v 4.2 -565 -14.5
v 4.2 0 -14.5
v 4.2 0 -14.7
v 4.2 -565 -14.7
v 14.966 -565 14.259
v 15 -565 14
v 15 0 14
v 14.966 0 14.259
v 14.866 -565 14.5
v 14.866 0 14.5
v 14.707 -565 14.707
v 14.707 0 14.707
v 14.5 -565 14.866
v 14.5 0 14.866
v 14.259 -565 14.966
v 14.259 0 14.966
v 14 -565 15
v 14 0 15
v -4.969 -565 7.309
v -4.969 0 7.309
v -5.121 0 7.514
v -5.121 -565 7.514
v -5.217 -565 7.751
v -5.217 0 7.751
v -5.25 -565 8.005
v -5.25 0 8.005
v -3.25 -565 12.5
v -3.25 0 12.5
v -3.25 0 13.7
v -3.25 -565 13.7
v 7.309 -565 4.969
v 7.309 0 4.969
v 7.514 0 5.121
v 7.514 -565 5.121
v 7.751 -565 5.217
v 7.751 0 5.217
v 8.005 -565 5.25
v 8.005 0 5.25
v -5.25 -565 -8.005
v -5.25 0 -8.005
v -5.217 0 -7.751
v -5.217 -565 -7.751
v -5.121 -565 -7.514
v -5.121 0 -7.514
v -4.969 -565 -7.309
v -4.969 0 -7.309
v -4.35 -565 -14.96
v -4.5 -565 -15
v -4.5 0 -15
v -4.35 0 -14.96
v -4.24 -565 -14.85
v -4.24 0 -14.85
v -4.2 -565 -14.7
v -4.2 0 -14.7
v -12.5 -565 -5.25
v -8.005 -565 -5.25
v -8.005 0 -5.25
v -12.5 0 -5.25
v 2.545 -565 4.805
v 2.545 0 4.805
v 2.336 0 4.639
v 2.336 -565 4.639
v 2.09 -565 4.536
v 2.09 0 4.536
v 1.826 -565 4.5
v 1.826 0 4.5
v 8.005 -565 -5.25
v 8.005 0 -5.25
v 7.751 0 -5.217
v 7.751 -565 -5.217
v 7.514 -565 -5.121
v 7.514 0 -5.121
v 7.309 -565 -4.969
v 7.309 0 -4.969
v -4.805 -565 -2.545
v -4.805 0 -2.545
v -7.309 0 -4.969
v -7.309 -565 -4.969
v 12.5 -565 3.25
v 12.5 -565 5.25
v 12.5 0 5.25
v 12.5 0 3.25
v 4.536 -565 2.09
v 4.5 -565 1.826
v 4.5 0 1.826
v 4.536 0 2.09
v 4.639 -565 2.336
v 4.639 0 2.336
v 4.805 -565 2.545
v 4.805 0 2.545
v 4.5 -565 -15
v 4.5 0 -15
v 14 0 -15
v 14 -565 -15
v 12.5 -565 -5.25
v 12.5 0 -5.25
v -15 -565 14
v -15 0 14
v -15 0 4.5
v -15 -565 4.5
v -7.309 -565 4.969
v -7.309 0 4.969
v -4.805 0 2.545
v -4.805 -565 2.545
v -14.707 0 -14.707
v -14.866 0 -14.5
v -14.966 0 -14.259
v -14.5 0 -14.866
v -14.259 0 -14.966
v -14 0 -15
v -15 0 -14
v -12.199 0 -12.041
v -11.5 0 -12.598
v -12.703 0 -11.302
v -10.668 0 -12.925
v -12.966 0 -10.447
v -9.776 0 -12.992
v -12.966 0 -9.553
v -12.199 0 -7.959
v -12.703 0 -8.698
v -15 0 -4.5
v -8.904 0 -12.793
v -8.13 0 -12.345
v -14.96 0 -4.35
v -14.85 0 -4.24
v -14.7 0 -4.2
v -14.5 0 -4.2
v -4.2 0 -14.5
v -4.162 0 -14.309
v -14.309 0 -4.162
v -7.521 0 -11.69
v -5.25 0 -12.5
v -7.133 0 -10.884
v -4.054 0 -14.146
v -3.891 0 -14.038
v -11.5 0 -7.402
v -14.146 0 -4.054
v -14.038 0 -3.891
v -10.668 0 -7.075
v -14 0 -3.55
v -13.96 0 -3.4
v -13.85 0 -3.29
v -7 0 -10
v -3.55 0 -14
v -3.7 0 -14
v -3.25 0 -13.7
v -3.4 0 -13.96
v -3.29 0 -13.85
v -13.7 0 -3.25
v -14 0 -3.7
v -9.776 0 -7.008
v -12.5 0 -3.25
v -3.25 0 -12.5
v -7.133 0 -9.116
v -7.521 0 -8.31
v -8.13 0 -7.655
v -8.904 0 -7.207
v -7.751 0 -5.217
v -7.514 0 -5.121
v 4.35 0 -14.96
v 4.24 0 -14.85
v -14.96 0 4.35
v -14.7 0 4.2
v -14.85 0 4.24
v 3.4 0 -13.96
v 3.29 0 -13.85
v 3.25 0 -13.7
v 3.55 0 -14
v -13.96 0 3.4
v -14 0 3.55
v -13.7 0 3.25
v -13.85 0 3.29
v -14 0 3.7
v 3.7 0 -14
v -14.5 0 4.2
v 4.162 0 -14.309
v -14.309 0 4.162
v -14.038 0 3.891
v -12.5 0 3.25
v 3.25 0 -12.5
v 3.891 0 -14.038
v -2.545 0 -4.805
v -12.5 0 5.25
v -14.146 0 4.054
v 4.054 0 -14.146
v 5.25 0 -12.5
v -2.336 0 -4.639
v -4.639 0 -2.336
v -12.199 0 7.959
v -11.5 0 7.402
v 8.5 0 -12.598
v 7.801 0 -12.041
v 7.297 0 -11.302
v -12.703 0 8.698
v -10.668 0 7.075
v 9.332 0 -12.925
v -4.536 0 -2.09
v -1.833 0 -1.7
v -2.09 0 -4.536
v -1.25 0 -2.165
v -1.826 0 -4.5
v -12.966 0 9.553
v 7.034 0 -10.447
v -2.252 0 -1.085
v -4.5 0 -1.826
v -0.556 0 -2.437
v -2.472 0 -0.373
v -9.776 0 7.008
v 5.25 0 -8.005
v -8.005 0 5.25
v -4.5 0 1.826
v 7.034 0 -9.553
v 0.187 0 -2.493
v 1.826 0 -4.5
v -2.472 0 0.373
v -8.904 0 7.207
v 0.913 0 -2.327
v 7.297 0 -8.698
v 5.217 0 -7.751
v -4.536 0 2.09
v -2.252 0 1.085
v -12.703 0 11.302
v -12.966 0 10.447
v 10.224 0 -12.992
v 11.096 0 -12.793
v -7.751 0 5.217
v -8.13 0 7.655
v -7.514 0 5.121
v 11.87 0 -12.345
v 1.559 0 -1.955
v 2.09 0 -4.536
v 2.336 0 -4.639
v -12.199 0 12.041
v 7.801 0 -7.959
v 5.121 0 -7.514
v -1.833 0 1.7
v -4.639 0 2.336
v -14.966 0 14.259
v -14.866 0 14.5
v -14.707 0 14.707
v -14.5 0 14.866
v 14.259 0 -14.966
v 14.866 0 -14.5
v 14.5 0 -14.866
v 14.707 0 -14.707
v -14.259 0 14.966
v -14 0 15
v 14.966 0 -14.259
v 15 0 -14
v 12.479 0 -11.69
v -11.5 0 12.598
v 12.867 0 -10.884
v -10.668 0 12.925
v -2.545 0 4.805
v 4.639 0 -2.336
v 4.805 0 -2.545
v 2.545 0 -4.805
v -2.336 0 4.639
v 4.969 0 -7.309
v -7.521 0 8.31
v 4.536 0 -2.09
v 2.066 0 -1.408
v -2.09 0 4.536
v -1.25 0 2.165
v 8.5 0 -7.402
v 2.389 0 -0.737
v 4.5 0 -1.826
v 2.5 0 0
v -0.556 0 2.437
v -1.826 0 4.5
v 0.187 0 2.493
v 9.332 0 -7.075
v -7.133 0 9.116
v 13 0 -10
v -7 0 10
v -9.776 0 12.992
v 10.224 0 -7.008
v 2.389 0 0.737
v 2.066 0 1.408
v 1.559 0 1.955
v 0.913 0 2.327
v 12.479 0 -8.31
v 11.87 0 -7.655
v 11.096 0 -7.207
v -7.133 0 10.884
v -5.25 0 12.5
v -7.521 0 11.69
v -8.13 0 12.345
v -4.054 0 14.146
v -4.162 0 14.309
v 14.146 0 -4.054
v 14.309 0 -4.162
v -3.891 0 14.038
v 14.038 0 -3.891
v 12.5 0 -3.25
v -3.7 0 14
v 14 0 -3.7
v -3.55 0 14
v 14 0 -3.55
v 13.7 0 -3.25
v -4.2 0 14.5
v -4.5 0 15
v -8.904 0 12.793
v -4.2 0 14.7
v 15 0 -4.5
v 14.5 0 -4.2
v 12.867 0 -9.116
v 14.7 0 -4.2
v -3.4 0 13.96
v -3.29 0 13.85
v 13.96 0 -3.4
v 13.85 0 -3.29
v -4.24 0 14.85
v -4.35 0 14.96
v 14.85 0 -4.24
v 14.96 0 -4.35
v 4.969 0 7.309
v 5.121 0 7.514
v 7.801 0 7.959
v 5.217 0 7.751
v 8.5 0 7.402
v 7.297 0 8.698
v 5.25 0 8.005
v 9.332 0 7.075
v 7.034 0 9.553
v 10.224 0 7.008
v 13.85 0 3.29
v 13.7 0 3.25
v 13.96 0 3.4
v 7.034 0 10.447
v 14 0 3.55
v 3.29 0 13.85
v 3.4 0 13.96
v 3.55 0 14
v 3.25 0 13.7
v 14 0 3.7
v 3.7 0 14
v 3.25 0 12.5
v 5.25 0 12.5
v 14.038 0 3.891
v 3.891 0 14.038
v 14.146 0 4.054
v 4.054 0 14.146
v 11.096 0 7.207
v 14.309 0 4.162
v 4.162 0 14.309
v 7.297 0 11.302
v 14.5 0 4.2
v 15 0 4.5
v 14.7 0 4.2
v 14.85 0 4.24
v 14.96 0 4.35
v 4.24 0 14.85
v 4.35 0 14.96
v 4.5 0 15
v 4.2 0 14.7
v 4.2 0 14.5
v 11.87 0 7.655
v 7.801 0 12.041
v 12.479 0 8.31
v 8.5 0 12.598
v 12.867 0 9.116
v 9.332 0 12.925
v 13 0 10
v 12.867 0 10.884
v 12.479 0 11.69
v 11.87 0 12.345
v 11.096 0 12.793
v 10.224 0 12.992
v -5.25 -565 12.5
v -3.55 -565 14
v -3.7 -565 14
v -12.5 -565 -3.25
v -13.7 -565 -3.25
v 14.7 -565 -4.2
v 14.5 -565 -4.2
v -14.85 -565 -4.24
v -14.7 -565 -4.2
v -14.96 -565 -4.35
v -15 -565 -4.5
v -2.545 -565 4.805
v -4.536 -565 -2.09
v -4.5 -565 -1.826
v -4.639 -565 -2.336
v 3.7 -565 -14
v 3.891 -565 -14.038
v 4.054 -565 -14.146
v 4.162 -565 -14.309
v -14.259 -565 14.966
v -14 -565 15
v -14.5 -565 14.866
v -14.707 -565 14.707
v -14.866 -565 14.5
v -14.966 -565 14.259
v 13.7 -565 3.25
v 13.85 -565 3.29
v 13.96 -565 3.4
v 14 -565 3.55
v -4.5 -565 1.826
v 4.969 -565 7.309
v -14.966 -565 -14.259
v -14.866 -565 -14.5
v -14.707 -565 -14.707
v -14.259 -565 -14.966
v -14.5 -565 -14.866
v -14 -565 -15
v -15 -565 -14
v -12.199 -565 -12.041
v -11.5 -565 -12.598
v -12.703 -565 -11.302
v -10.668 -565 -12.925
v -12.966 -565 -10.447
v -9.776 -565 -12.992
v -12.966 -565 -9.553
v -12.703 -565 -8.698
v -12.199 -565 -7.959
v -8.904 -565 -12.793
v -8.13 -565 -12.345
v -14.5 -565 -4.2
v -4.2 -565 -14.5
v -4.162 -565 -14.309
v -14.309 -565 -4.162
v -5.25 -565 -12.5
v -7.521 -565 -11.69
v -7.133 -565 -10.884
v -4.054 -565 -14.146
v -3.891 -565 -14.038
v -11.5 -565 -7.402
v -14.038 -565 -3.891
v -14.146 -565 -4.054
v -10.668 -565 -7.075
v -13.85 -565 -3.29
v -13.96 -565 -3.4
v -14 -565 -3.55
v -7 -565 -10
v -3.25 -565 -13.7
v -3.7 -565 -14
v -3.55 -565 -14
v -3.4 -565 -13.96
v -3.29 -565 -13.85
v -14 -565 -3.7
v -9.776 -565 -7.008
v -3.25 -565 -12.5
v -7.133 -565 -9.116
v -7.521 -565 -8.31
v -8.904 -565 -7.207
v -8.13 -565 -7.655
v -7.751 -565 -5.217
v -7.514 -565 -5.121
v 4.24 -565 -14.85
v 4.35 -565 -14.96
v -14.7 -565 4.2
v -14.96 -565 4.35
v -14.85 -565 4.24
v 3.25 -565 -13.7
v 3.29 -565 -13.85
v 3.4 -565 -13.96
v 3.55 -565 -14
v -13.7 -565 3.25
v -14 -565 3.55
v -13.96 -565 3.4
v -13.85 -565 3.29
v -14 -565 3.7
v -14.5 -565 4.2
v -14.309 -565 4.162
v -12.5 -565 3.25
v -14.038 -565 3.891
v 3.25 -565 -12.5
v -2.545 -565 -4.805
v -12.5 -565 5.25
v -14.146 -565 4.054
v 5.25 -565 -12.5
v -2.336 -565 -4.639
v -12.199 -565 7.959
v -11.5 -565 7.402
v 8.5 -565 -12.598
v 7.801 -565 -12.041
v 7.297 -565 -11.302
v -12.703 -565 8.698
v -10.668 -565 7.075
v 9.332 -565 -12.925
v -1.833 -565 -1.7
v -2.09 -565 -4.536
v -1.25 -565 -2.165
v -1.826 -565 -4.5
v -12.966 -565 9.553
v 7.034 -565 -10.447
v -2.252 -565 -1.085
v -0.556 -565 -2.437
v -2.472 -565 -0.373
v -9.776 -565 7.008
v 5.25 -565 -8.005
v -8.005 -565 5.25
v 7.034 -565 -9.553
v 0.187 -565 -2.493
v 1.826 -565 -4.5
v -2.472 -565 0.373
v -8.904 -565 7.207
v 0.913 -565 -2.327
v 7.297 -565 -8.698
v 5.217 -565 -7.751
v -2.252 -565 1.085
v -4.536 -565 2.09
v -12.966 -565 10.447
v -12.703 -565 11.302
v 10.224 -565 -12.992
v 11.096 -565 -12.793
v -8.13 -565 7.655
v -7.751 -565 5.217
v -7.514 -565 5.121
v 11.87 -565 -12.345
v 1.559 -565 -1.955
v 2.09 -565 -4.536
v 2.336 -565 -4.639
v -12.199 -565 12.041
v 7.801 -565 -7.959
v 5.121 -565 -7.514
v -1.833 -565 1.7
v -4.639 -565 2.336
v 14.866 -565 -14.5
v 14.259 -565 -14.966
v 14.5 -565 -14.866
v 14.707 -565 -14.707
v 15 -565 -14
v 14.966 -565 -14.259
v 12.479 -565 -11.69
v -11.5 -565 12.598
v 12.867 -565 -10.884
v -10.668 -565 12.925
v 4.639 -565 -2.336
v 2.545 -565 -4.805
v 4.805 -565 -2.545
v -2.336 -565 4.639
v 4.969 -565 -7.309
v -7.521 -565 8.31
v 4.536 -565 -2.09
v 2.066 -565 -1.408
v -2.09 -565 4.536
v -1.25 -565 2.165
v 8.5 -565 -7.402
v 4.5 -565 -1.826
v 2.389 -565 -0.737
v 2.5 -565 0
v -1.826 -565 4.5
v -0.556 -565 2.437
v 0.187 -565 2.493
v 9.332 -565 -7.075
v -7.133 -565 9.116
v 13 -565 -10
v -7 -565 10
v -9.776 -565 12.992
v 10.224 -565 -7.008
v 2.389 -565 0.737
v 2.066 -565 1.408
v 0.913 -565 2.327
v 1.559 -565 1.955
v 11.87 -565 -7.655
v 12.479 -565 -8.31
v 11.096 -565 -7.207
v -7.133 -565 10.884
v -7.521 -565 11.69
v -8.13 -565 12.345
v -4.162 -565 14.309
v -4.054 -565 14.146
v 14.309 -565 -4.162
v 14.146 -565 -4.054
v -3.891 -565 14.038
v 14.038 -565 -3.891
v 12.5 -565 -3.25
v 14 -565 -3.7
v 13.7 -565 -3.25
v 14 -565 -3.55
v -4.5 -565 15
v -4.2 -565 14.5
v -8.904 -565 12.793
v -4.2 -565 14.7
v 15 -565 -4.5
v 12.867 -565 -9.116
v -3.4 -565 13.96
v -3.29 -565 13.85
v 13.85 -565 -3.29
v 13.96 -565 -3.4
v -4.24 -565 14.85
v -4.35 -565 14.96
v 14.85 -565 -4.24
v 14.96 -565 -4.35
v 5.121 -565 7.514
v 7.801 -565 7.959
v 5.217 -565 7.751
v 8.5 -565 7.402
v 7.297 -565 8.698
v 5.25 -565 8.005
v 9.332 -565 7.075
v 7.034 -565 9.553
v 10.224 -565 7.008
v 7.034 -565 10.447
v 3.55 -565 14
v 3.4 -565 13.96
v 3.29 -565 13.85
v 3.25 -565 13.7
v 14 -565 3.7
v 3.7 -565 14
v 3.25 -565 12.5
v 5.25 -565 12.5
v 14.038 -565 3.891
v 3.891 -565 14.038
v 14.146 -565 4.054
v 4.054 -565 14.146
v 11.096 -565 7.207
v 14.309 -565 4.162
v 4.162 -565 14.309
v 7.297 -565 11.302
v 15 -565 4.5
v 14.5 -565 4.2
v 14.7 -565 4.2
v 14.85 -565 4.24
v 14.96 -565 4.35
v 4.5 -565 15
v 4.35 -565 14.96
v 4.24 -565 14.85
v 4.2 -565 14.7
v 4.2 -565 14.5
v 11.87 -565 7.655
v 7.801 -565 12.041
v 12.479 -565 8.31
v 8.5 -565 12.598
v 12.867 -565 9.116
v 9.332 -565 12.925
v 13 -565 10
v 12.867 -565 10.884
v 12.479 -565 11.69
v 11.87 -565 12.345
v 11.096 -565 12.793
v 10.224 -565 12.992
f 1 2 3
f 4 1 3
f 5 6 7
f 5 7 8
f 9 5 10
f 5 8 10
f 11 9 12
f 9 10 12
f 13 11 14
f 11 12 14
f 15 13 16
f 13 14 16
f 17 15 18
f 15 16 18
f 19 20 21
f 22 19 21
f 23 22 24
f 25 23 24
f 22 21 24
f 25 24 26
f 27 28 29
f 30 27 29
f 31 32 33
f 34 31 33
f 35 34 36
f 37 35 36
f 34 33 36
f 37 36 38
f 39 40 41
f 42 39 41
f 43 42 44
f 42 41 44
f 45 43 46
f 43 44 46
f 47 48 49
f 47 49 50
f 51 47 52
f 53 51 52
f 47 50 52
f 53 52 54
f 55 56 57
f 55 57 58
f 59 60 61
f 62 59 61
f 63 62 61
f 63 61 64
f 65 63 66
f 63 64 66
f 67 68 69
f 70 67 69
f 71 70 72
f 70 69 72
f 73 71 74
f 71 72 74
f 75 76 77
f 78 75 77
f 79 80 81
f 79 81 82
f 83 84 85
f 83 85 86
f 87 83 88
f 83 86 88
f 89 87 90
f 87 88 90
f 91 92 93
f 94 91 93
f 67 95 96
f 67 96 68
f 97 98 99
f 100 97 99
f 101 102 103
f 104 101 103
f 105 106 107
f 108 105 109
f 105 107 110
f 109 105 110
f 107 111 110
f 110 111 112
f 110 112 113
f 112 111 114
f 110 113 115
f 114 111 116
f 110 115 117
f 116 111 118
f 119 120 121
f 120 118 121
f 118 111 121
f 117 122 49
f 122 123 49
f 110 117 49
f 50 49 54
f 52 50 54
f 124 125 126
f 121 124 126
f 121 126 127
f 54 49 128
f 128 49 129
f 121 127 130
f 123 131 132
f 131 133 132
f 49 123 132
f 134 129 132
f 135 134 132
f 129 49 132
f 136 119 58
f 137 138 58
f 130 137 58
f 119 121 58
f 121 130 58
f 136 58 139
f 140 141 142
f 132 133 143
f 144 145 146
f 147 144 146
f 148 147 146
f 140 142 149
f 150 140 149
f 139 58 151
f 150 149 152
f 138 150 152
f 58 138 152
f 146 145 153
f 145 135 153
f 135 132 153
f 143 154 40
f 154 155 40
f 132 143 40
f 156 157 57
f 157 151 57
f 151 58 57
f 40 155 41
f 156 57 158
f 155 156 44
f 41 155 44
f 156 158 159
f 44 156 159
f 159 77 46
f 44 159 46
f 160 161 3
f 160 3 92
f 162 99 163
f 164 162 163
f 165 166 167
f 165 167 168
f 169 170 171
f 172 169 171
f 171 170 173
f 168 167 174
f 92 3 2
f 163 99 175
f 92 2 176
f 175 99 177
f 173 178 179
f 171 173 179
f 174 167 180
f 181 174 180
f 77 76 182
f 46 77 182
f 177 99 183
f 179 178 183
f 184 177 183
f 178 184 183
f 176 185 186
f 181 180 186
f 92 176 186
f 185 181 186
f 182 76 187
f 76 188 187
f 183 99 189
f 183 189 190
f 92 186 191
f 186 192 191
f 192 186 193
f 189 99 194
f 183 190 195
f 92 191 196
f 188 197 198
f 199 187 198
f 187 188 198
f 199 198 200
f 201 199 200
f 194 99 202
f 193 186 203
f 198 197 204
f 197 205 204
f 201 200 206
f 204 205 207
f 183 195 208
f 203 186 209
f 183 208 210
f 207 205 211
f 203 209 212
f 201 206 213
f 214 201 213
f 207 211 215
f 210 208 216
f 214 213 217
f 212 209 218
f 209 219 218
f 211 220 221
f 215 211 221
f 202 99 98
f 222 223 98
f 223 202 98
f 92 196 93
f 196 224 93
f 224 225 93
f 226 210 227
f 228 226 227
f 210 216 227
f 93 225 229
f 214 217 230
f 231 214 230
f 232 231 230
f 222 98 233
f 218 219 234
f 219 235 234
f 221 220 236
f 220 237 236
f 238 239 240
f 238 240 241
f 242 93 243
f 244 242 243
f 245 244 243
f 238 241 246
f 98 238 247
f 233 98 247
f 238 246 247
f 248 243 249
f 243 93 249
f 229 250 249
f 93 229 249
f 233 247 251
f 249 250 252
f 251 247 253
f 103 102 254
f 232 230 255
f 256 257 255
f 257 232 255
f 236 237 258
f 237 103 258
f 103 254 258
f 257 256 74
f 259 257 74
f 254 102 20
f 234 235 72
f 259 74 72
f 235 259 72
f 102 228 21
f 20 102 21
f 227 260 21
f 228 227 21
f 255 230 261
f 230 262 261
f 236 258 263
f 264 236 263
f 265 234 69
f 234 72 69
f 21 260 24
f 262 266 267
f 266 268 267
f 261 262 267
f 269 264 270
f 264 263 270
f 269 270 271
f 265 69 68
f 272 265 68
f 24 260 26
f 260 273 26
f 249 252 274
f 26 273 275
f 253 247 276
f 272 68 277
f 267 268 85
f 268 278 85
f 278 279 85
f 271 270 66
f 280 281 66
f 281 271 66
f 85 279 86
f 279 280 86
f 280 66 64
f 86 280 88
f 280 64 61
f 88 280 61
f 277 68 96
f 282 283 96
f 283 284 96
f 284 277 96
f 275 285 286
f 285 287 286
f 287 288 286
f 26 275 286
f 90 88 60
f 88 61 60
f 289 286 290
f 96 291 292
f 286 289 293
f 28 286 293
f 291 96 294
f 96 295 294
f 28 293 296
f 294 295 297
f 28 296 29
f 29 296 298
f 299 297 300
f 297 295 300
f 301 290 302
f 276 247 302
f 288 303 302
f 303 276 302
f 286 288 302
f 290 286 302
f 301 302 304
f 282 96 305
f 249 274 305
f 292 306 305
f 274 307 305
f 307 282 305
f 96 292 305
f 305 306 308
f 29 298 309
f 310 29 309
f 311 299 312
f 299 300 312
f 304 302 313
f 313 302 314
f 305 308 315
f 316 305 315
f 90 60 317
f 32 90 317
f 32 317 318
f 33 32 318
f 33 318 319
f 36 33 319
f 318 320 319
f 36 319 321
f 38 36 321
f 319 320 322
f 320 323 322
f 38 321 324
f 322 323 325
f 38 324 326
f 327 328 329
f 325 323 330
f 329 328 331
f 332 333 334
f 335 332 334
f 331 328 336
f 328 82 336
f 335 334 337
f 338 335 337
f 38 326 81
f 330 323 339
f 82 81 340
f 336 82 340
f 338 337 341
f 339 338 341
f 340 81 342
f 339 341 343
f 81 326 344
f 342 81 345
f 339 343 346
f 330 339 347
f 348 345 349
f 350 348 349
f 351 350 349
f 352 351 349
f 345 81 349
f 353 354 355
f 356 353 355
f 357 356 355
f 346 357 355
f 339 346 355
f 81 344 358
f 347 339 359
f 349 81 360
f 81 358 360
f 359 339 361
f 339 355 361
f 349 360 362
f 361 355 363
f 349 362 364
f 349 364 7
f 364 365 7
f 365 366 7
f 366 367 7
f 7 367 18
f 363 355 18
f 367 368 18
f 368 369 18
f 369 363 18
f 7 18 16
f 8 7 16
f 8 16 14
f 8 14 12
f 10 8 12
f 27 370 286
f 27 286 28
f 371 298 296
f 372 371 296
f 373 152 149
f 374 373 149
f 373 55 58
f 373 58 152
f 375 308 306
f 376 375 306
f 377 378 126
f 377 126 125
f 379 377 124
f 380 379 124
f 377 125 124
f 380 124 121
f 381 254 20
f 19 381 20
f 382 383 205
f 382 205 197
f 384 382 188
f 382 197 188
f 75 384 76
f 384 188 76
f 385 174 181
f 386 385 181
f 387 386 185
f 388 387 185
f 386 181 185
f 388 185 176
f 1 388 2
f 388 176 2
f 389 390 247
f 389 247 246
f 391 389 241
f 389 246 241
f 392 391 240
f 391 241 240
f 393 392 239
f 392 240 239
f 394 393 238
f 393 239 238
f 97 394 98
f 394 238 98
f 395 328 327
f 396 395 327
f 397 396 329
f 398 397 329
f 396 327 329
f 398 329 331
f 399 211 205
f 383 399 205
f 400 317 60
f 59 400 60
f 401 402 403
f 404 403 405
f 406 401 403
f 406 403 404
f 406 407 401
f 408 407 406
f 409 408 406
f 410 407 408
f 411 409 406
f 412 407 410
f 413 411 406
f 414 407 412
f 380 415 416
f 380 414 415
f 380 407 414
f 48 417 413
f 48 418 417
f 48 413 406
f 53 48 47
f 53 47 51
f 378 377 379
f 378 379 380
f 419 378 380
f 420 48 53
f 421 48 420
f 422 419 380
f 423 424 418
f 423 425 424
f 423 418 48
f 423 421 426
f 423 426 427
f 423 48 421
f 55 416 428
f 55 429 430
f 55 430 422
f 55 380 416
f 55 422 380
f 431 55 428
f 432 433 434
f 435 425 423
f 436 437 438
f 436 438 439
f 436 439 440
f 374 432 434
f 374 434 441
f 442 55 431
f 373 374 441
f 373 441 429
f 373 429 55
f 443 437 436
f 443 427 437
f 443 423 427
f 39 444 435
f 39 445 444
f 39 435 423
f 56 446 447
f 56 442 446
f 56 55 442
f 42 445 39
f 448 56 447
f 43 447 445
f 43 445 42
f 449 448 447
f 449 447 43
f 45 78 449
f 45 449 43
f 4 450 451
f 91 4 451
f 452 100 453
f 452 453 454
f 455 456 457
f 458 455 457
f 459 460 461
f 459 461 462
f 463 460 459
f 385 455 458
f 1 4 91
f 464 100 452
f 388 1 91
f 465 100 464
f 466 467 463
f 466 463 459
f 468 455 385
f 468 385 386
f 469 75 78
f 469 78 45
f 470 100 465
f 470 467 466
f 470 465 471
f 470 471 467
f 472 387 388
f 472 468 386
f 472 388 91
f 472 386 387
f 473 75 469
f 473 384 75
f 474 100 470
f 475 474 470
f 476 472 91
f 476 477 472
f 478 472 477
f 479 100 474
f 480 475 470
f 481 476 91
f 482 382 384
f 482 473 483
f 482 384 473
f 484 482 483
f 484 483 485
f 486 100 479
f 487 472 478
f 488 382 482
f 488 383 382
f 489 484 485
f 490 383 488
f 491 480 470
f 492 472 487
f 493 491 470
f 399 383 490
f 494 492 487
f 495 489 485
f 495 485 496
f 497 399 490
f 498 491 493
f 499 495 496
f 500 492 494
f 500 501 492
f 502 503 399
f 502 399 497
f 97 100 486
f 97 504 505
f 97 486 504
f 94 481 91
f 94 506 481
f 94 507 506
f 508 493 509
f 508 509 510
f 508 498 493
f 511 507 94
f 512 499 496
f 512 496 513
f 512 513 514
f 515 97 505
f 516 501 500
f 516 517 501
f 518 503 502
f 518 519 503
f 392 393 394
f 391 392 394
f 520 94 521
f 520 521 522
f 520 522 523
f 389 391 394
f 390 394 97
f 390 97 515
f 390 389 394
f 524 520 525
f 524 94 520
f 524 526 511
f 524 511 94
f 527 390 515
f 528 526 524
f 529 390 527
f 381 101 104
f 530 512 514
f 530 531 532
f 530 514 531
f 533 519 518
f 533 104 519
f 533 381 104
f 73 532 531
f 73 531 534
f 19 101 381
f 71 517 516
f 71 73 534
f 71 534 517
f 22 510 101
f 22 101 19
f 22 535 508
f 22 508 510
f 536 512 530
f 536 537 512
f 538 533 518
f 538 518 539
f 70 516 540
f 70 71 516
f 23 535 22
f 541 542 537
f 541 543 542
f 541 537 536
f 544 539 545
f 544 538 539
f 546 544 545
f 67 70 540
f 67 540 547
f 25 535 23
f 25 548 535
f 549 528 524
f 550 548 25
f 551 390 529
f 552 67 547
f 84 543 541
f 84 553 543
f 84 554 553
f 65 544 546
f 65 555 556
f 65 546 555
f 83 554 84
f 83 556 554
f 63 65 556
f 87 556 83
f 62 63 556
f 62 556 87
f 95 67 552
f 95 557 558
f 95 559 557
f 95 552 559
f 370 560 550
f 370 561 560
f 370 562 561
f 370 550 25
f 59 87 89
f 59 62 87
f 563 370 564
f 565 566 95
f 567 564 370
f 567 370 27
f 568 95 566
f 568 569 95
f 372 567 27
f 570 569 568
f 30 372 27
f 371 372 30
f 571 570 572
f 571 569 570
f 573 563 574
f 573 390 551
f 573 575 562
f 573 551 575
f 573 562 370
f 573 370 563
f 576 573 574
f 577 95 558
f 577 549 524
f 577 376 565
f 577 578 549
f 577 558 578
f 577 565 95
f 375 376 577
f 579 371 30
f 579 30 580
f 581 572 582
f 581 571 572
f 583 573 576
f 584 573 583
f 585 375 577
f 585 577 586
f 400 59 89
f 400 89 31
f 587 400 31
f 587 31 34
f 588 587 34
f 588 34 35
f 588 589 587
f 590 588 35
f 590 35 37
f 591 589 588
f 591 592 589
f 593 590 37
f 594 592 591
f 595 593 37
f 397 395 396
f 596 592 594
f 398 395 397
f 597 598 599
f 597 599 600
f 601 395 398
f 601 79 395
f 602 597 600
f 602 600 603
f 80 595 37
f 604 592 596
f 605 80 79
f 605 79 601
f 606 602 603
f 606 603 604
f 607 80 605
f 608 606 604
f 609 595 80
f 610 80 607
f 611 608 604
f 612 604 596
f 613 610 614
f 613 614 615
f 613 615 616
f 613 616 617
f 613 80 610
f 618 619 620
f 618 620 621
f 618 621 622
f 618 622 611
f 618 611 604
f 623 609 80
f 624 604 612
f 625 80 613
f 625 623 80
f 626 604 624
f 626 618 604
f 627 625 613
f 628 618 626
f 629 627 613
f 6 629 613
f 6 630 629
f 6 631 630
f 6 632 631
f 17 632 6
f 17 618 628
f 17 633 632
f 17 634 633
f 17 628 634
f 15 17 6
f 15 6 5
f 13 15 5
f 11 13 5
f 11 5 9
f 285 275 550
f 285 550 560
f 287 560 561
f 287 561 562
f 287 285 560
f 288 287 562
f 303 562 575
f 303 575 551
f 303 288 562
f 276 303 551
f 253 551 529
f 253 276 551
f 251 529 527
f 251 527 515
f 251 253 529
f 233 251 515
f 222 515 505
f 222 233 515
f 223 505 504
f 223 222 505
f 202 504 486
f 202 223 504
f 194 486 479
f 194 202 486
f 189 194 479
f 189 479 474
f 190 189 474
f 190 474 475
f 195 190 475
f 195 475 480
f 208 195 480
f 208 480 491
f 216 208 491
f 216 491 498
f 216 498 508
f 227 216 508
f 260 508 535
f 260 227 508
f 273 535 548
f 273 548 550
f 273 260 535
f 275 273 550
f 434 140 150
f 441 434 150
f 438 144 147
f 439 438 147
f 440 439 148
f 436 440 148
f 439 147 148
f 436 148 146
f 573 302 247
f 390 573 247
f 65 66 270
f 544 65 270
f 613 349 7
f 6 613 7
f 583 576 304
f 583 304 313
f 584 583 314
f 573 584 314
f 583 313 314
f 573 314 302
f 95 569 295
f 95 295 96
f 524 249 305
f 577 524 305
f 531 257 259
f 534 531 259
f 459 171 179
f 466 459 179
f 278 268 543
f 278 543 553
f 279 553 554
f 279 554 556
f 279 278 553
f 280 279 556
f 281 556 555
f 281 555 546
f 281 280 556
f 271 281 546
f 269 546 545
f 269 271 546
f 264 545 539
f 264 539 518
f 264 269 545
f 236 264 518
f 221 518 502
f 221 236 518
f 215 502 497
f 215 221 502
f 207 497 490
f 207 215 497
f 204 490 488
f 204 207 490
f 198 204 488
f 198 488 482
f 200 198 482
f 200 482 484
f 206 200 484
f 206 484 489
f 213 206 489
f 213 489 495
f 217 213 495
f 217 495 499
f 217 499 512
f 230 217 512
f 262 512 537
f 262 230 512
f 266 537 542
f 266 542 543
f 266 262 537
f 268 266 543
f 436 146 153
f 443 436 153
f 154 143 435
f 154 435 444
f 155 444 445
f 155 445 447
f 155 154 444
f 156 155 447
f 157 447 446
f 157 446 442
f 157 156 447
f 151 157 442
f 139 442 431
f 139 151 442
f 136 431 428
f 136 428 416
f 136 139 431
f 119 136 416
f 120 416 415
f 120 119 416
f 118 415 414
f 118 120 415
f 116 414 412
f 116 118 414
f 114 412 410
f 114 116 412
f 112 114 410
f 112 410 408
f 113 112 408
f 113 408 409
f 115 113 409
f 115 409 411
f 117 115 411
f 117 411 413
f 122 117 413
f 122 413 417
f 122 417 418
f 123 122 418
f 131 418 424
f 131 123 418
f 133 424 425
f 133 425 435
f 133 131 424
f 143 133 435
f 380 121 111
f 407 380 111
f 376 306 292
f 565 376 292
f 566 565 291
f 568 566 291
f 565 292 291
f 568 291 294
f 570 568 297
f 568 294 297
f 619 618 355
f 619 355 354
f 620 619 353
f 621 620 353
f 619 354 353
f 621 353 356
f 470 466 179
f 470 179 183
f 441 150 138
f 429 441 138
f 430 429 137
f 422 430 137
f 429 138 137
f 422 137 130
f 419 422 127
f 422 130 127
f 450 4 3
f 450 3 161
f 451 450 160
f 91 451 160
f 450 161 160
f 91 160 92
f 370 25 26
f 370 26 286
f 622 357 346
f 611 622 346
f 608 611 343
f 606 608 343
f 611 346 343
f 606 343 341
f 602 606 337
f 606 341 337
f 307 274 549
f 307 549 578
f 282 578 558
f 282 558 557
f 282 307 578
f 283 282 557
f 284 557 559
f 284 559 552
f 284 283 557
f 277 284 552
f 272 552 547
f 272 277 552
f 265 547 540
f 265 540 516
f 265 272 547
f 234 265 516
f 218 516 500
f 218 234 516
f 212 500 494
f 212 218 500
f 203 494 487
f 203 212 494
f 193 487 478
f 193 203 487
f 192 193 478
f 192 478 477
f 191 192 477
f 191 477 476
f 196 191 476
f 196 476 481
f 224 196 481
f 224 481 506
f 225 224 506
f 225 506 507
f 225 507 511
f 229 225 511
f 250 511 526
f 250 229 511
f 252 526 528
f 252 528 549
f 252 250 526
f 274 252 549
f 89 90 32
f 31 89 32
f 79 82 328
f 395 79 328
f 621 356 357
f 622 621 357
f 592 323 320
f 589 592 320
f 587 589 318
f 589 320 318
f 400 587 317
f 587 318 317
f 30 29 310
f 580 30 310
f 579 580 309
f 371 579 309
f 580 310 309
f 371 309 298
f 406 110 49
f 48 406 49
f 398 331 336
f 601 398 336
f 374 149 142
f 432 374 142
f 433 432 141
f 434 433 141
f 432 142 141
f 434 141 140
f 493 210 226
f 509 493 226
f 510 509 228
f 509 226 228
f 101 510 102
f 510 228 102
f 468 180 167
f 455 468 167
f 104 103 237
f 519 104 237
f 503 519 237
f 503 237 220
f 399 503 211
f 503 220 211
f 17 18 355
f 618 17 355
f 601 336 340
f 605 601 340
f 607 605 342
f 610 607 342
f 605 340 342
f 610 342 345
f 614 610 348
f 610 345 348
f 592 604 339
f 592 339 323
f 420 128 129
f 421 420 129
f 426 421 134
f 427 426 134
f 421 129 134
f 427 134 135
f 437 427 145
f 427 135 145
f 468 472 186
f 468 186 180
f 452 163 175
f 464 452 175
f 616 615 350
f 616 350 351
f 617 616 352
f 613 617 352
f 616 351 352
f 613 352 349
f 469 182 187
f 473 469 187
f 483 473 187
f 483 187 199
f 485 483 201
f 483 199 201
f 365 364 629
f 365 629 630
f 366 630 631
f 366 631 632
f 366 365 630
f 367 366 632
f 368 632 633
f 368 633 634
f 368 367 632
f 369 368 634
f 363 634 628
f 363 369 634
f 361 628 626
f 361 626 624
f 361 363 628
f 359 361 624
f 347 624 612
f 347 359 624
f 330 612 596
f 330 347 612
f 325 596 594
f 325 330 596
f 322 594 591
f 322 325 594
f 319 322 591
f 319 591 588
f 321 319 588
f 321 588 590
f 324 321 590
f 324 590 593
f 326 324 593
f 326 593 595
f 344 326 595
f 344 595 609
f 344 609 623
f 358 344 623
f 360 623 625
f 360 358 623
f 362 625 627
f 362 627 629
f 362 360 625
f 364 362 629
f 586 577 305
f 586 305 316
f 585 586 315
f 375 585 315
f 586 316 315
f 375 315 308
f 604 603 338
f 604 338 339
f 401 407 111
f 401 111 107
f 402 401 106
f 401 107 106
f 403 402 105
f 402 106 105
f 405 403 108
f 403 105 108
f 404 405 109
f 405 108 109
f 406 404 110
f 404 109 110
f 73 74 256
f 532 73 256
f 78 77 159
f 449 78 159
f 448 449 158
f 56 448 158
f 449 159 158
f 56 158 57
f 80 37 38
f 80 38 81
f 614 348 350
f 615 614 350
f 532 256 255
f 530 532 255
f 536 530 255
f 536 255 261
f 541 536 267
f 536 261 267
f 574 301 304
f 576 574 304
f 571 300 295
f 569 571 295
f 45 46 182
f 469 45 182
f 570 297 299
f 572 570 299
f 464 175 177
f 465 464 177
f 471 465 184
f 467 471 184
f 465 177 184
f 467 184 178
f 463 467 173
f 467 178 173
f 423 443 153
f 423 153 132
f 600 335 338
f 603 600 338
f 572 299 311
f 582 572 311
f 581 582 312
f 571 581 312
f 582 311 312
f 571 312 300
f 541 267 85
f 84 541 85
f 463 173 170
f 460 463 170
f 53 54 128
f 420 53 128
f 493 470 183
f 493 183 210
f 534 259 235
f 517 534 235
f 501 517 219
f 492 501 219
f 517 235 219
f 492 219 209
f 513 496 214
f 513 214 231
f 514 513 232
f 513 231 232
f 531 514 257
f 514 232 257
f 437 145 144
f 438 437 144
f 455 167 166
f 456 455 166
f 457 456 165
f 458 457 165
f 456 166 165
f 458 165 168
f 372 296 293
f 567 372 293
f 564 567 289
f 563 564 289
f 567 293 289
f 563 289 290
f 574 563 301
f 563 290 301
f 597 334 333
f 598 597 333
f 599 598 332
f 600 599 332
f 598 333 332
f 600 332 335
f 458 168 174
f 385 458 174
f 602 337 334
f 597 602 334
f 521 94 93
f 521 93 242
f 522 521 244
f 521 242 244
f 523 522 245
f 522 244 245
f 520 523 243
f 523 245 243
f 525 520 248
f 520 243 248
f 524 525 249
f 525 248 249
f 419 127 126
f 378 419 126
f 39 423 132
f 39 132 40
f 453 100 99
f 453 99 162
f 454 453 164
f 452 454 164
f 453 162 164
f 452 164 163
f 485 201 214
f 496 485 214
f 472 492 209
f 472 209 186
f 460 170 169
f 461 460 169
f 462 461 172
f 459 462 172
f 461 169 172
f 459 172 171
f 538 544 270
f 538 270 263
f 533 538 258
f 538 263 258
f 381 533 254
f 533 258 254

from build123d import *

# Parameters (mm, degrees)
F0_R     = 3
F0_R_2   = 2.5
F1_DEPTH = 565


with BuildPart() as f1:
    # F0 (on Front) → F1 (new body)
    with BuildSketch(Plane.XZ):
        with BuildLine():
            Line((-4.5, 15), (-14, 15))
            ThreePointArc((-14, 15), (-14.707107, 14.707107), (-15, 14))
            Line((-15, 14), (-15, 4.5))
            ThreePointArc((-15, 4.5), (-14.912132, 4.287868), (-14.7, 4.2))
            Line((-14.7, 4.2), (-14.5, 4.2))
            ThreePointArc((-14.5, 4.2), (-14.146447, 4.053553), (-14, 3.7))
            Line((-14, 3.7), (-14, 3.55))
            ThreePointArc((-14, 3.55), (-13.912132, 3.337868), (-13.7, 3.25))
            Line((-13.7, 3.25), (-12.5, 3.25))
            Line((-12.5, 3.25), (-12.5, 5.25))
            Line((-12.5, 5.25), (-8.004644, 5.25))
            ThreePointArc((-8.004644, 5.25), (-7.629545, 5.176985), (-7.309222, 4.968602))
            Line((-7.309222, 4.968602), (-4.804579, 2.544753))
            ThreePointArc((-4.804579, 2.544753), (-4.579288, 2.216394), (-4.5, 1.826151))
            Line((-4.5, 1.826151), (-4.5, -1.826151))
            ThreePointArc((-4.5, -1.826151), (-4.579288, -2.216394), (-4.804579, -2.544753))
            Line((-4.804579, -2.544753), (-7.309222, -4.968602))
            ThreePointArc((-7.309222, -4.968602), (-7.629545, -5.176985), (-8.004644, -5.25))
            Line((-8.004644, -5.25), (-12.5, -5.25))
            Line((-12.5, -5.25), (-12.5, -3.25))
            Line((-12.5, -3.25), (-13.7, -3.25))
            ThreePointArc((-13.7, -3.25), (-13.912132, -3.337868), (-14, -3.55))
            Line((-14, -3.55), (-14, -3.7))
            ThreePointArc((-14, -3.7), (-14.146447, -4.053553), (-14.5, -4.2))
            Line((-14.5, -4.2), (-14.7, -4.2))
            ThreePointArc((-14.7, -4.2), (-14.912132, -4.287868), (-15, -4.5))
            Line((-15, -4.5), (-15, -14))
            ThreePointArc((-15, -14), (-14.707107, -14.707107), (-14, -15))
            Line((-14, -15), (-4.5, -15))
            ThreePointArc((-4.5, -15), (-4.287868, -14.912132), (-4.2, -14.7))
            Line((-4.2, -14.7), (-4.2, -14.5))
            ThreePointArc((-4.2, -14.5), (-4.053553, -14.146447), (-3.7, -14))
            Line((-3.7, -14), (-3.55, -14))
            ThreePointArc((-3.55, -14), (-3.337868, -13.912132), (-3.25, -13.7))
            Line((-3.25, -13.7), (-3.25, -12.5))
            Line((-3.25, -12.5), (-5.25, -12.5))
            Line((-5.25, -12.5), (-5.25, -8.004644))
            ThreePointArc((-5.25, -8.004644), (-5.176985, -7.629545), (-4.968602, -7.309222))
            Line((-4.968602, -7.309222), (-2.544753, -4.804579))
            ThreePointArc((-2.544753, -4.804579), (-2.216394, -4.579288), (-1.826151, -4.5))
            Line((-1.826151, -4.5), (1.826151, -4.5))
            ThreePointArc((1.826151, -4.5), (2.216394, -4.579288), (2.544753, -4.804579))
            Line((2.544753, -4.804579), (4.968602, -7.309222))
            ThreePointArc((4.968602, -7.309222), (5.176985, -7.629545), (5.25, -8.004644))
            Line((5.25, -8.004644), (5.25, -12.5))
            Line((5.25, -12.5), (3.25, -12.5))
            Line((3.25, -12.5), (3.25, -13.7))
            ThreePointArc((3.25, -13.7), (3.337868, -13.912132), (3.55, -14))
            Line((3.55, -14), (3.7, -14))
            ThreePointArc((3.7, -14), (4.053553, -14.146447), (4.2, -14.5))
            Line((4.2, -14.5), (4.2, -14.7))
            ThreePointArc((4.2, -14.7), (4.287868, -14.912132), (4.5, -15))
            Line((4.5, -15), (14, -15))
            ThreePointArc((14, -15), (14.707107, -14.707107), (15, -14))
            Line((15, -14), (15, -4.5))
            ThreePointArc((15, -4.5), (14.912132, -4.287868), (14.7, -4.2))
            Line((14.7, -4.2), (14.5, -4.2))
            ThreePointArc((14.5, -4.2), (14.146447, -4.053553), (14, -3.7))
            Line((14, -3.7), (14, -3.55))
            ThreePointArc((14, -3.55), (13.912132, -3.337868), (13.7, -3.25))
            Line((13.7, -3.25), (12.5, -3.25))
            Line((12.5, -3.25), (12.5, -5.25))
            Line((12.5, -5.25), (8.004644, -5.25))
            ThreePointArc((8.004644, -5.25), (7.629545, -5.176985), (7.309222, -4.968602))
            Line((7.309222, -4.968602), (4.804579, -2.544753))
            ThreePointArc((4.804579, -2.544753), (4.579288, -2.216394), (4.5, -1.826151))
            Line((4.5, -1.826151), (4.5, 1.826151))
            ThreePointArc((4.5, 1.826151), (4.579288, 2.216394), (4.804579, 2.544753))
            Line((4.804579, 2.544753), (7.309222, 4.968602))
            ThreePointArc((7.309222, 4.968602), (7.629545, 5.176985), (8.004644, 5.25))
            Line((8.004644, 5.25), (12.5, 5.25))
            Line((12.5, 5.25), (12.5, 3.25))
            Line((12.5, 3.25), (13.7, 3.25))
            ThreePointArc((13.7, 3.25), (13.912132, 3.337868), (14, 3.55))
            Line((14, 3.55), (14, 3.7))
            ThreePointArc((14, 3.7), (14.146447, 4.053553), (14.5, 4.2))
            Line((14.5, 4.2), (14.7, 4.2))
            ThreePointArc((14.7, 4.2), (14.912132, 4.287868), (15, 4.5))
            Line((15, 4.5), (15, 14))
            ThreePointArc((15, 14), (14.707107, 14.707107), (14, 15))
            Line((14, 15), (4.5, 15))
            ThreePointArc((4.5, 15), (4.287868, 14.912132), (4.2, 14.7))
            Line((4.2, 14.7), (4.2, 14.5))
            ThreePointArc((4.2, 14.5), (4.053553, 14.146447), (3.7, 14))
            Line((3.7, 14), (3.55, 14))
            ThreePointArc((3.55, 14), (3.337868, 13.912132), (3.25, 13.7))
            Line((3.25, 13.7), (3.25, 12.5))
            Line((3.25, 12.5), (5.25, 12.5))
            Line((5.25, 12.5), (5.25, 8.004644))
            ThreePointArc((5.25, 8.004644), (5.176985, 7.629545), (4.968602, 7.309222))
            Line((4.968602, 7.309222), (2.544753, 4.804579))
            ThreePointArc((2.544753, 4.804579), (2.216394, 4.579288), (1.826151, 4.5))
            Line((1.826151, 4.5), (-1.826151, 4.5))
            ThreePointArc((-1.826151, 4.5), (-2.216394, 4.579288), (-2.544753, 4.804579))
            Line((-2.544753, 4.804579), (-4.968602, 7.309222))
            ThreePointArc((-4.968602, 7.309222), (-5.176985, 7.629545), (-5.25, 8.004644))
            Line((-5.25, 8.004644), (-5.25, 12.5))
            Line((-5.25, 12.5), (-3.25, 12.5))
            Line((-3.25, 12.5), (-3.25, 13.7))
            ThreePointArc((-3.25, 13.7), (-3.337868, 13.912132), (-3.55, 14))
            Line((-3.55, 14), (-3.7, 14))
            ThreePointArc((-3.7, 14), (-4.053553, 14.146447), (-4.2, 14.5))
            Line((-4.2, 14.5), (-4.2, 14.7))
            ThreePointArc((-4.2, 14.7), (-4.287868, 14.912132), (-4.5, 15))
        make_face()
        with Locations((-10, -10)):
            Circle(F0_R, mode=Mode.SUBTRACT)
        with Locations((10, -10)):
            Circle(F0_R, mode=Mode.SUBTRACT)
        with Locations((-10, 10)):
            Circle(F0_R, mode=Mode.SUBTRACT)
        Circle(F0_R_2, mode=Mode.SUBTRACT)
        with Locations((10, 10)):
            Circle(F0_R, mode=Mode.SUBTRACT)
    extrude(amount=F1_DEPTH)


solid = f1.part
